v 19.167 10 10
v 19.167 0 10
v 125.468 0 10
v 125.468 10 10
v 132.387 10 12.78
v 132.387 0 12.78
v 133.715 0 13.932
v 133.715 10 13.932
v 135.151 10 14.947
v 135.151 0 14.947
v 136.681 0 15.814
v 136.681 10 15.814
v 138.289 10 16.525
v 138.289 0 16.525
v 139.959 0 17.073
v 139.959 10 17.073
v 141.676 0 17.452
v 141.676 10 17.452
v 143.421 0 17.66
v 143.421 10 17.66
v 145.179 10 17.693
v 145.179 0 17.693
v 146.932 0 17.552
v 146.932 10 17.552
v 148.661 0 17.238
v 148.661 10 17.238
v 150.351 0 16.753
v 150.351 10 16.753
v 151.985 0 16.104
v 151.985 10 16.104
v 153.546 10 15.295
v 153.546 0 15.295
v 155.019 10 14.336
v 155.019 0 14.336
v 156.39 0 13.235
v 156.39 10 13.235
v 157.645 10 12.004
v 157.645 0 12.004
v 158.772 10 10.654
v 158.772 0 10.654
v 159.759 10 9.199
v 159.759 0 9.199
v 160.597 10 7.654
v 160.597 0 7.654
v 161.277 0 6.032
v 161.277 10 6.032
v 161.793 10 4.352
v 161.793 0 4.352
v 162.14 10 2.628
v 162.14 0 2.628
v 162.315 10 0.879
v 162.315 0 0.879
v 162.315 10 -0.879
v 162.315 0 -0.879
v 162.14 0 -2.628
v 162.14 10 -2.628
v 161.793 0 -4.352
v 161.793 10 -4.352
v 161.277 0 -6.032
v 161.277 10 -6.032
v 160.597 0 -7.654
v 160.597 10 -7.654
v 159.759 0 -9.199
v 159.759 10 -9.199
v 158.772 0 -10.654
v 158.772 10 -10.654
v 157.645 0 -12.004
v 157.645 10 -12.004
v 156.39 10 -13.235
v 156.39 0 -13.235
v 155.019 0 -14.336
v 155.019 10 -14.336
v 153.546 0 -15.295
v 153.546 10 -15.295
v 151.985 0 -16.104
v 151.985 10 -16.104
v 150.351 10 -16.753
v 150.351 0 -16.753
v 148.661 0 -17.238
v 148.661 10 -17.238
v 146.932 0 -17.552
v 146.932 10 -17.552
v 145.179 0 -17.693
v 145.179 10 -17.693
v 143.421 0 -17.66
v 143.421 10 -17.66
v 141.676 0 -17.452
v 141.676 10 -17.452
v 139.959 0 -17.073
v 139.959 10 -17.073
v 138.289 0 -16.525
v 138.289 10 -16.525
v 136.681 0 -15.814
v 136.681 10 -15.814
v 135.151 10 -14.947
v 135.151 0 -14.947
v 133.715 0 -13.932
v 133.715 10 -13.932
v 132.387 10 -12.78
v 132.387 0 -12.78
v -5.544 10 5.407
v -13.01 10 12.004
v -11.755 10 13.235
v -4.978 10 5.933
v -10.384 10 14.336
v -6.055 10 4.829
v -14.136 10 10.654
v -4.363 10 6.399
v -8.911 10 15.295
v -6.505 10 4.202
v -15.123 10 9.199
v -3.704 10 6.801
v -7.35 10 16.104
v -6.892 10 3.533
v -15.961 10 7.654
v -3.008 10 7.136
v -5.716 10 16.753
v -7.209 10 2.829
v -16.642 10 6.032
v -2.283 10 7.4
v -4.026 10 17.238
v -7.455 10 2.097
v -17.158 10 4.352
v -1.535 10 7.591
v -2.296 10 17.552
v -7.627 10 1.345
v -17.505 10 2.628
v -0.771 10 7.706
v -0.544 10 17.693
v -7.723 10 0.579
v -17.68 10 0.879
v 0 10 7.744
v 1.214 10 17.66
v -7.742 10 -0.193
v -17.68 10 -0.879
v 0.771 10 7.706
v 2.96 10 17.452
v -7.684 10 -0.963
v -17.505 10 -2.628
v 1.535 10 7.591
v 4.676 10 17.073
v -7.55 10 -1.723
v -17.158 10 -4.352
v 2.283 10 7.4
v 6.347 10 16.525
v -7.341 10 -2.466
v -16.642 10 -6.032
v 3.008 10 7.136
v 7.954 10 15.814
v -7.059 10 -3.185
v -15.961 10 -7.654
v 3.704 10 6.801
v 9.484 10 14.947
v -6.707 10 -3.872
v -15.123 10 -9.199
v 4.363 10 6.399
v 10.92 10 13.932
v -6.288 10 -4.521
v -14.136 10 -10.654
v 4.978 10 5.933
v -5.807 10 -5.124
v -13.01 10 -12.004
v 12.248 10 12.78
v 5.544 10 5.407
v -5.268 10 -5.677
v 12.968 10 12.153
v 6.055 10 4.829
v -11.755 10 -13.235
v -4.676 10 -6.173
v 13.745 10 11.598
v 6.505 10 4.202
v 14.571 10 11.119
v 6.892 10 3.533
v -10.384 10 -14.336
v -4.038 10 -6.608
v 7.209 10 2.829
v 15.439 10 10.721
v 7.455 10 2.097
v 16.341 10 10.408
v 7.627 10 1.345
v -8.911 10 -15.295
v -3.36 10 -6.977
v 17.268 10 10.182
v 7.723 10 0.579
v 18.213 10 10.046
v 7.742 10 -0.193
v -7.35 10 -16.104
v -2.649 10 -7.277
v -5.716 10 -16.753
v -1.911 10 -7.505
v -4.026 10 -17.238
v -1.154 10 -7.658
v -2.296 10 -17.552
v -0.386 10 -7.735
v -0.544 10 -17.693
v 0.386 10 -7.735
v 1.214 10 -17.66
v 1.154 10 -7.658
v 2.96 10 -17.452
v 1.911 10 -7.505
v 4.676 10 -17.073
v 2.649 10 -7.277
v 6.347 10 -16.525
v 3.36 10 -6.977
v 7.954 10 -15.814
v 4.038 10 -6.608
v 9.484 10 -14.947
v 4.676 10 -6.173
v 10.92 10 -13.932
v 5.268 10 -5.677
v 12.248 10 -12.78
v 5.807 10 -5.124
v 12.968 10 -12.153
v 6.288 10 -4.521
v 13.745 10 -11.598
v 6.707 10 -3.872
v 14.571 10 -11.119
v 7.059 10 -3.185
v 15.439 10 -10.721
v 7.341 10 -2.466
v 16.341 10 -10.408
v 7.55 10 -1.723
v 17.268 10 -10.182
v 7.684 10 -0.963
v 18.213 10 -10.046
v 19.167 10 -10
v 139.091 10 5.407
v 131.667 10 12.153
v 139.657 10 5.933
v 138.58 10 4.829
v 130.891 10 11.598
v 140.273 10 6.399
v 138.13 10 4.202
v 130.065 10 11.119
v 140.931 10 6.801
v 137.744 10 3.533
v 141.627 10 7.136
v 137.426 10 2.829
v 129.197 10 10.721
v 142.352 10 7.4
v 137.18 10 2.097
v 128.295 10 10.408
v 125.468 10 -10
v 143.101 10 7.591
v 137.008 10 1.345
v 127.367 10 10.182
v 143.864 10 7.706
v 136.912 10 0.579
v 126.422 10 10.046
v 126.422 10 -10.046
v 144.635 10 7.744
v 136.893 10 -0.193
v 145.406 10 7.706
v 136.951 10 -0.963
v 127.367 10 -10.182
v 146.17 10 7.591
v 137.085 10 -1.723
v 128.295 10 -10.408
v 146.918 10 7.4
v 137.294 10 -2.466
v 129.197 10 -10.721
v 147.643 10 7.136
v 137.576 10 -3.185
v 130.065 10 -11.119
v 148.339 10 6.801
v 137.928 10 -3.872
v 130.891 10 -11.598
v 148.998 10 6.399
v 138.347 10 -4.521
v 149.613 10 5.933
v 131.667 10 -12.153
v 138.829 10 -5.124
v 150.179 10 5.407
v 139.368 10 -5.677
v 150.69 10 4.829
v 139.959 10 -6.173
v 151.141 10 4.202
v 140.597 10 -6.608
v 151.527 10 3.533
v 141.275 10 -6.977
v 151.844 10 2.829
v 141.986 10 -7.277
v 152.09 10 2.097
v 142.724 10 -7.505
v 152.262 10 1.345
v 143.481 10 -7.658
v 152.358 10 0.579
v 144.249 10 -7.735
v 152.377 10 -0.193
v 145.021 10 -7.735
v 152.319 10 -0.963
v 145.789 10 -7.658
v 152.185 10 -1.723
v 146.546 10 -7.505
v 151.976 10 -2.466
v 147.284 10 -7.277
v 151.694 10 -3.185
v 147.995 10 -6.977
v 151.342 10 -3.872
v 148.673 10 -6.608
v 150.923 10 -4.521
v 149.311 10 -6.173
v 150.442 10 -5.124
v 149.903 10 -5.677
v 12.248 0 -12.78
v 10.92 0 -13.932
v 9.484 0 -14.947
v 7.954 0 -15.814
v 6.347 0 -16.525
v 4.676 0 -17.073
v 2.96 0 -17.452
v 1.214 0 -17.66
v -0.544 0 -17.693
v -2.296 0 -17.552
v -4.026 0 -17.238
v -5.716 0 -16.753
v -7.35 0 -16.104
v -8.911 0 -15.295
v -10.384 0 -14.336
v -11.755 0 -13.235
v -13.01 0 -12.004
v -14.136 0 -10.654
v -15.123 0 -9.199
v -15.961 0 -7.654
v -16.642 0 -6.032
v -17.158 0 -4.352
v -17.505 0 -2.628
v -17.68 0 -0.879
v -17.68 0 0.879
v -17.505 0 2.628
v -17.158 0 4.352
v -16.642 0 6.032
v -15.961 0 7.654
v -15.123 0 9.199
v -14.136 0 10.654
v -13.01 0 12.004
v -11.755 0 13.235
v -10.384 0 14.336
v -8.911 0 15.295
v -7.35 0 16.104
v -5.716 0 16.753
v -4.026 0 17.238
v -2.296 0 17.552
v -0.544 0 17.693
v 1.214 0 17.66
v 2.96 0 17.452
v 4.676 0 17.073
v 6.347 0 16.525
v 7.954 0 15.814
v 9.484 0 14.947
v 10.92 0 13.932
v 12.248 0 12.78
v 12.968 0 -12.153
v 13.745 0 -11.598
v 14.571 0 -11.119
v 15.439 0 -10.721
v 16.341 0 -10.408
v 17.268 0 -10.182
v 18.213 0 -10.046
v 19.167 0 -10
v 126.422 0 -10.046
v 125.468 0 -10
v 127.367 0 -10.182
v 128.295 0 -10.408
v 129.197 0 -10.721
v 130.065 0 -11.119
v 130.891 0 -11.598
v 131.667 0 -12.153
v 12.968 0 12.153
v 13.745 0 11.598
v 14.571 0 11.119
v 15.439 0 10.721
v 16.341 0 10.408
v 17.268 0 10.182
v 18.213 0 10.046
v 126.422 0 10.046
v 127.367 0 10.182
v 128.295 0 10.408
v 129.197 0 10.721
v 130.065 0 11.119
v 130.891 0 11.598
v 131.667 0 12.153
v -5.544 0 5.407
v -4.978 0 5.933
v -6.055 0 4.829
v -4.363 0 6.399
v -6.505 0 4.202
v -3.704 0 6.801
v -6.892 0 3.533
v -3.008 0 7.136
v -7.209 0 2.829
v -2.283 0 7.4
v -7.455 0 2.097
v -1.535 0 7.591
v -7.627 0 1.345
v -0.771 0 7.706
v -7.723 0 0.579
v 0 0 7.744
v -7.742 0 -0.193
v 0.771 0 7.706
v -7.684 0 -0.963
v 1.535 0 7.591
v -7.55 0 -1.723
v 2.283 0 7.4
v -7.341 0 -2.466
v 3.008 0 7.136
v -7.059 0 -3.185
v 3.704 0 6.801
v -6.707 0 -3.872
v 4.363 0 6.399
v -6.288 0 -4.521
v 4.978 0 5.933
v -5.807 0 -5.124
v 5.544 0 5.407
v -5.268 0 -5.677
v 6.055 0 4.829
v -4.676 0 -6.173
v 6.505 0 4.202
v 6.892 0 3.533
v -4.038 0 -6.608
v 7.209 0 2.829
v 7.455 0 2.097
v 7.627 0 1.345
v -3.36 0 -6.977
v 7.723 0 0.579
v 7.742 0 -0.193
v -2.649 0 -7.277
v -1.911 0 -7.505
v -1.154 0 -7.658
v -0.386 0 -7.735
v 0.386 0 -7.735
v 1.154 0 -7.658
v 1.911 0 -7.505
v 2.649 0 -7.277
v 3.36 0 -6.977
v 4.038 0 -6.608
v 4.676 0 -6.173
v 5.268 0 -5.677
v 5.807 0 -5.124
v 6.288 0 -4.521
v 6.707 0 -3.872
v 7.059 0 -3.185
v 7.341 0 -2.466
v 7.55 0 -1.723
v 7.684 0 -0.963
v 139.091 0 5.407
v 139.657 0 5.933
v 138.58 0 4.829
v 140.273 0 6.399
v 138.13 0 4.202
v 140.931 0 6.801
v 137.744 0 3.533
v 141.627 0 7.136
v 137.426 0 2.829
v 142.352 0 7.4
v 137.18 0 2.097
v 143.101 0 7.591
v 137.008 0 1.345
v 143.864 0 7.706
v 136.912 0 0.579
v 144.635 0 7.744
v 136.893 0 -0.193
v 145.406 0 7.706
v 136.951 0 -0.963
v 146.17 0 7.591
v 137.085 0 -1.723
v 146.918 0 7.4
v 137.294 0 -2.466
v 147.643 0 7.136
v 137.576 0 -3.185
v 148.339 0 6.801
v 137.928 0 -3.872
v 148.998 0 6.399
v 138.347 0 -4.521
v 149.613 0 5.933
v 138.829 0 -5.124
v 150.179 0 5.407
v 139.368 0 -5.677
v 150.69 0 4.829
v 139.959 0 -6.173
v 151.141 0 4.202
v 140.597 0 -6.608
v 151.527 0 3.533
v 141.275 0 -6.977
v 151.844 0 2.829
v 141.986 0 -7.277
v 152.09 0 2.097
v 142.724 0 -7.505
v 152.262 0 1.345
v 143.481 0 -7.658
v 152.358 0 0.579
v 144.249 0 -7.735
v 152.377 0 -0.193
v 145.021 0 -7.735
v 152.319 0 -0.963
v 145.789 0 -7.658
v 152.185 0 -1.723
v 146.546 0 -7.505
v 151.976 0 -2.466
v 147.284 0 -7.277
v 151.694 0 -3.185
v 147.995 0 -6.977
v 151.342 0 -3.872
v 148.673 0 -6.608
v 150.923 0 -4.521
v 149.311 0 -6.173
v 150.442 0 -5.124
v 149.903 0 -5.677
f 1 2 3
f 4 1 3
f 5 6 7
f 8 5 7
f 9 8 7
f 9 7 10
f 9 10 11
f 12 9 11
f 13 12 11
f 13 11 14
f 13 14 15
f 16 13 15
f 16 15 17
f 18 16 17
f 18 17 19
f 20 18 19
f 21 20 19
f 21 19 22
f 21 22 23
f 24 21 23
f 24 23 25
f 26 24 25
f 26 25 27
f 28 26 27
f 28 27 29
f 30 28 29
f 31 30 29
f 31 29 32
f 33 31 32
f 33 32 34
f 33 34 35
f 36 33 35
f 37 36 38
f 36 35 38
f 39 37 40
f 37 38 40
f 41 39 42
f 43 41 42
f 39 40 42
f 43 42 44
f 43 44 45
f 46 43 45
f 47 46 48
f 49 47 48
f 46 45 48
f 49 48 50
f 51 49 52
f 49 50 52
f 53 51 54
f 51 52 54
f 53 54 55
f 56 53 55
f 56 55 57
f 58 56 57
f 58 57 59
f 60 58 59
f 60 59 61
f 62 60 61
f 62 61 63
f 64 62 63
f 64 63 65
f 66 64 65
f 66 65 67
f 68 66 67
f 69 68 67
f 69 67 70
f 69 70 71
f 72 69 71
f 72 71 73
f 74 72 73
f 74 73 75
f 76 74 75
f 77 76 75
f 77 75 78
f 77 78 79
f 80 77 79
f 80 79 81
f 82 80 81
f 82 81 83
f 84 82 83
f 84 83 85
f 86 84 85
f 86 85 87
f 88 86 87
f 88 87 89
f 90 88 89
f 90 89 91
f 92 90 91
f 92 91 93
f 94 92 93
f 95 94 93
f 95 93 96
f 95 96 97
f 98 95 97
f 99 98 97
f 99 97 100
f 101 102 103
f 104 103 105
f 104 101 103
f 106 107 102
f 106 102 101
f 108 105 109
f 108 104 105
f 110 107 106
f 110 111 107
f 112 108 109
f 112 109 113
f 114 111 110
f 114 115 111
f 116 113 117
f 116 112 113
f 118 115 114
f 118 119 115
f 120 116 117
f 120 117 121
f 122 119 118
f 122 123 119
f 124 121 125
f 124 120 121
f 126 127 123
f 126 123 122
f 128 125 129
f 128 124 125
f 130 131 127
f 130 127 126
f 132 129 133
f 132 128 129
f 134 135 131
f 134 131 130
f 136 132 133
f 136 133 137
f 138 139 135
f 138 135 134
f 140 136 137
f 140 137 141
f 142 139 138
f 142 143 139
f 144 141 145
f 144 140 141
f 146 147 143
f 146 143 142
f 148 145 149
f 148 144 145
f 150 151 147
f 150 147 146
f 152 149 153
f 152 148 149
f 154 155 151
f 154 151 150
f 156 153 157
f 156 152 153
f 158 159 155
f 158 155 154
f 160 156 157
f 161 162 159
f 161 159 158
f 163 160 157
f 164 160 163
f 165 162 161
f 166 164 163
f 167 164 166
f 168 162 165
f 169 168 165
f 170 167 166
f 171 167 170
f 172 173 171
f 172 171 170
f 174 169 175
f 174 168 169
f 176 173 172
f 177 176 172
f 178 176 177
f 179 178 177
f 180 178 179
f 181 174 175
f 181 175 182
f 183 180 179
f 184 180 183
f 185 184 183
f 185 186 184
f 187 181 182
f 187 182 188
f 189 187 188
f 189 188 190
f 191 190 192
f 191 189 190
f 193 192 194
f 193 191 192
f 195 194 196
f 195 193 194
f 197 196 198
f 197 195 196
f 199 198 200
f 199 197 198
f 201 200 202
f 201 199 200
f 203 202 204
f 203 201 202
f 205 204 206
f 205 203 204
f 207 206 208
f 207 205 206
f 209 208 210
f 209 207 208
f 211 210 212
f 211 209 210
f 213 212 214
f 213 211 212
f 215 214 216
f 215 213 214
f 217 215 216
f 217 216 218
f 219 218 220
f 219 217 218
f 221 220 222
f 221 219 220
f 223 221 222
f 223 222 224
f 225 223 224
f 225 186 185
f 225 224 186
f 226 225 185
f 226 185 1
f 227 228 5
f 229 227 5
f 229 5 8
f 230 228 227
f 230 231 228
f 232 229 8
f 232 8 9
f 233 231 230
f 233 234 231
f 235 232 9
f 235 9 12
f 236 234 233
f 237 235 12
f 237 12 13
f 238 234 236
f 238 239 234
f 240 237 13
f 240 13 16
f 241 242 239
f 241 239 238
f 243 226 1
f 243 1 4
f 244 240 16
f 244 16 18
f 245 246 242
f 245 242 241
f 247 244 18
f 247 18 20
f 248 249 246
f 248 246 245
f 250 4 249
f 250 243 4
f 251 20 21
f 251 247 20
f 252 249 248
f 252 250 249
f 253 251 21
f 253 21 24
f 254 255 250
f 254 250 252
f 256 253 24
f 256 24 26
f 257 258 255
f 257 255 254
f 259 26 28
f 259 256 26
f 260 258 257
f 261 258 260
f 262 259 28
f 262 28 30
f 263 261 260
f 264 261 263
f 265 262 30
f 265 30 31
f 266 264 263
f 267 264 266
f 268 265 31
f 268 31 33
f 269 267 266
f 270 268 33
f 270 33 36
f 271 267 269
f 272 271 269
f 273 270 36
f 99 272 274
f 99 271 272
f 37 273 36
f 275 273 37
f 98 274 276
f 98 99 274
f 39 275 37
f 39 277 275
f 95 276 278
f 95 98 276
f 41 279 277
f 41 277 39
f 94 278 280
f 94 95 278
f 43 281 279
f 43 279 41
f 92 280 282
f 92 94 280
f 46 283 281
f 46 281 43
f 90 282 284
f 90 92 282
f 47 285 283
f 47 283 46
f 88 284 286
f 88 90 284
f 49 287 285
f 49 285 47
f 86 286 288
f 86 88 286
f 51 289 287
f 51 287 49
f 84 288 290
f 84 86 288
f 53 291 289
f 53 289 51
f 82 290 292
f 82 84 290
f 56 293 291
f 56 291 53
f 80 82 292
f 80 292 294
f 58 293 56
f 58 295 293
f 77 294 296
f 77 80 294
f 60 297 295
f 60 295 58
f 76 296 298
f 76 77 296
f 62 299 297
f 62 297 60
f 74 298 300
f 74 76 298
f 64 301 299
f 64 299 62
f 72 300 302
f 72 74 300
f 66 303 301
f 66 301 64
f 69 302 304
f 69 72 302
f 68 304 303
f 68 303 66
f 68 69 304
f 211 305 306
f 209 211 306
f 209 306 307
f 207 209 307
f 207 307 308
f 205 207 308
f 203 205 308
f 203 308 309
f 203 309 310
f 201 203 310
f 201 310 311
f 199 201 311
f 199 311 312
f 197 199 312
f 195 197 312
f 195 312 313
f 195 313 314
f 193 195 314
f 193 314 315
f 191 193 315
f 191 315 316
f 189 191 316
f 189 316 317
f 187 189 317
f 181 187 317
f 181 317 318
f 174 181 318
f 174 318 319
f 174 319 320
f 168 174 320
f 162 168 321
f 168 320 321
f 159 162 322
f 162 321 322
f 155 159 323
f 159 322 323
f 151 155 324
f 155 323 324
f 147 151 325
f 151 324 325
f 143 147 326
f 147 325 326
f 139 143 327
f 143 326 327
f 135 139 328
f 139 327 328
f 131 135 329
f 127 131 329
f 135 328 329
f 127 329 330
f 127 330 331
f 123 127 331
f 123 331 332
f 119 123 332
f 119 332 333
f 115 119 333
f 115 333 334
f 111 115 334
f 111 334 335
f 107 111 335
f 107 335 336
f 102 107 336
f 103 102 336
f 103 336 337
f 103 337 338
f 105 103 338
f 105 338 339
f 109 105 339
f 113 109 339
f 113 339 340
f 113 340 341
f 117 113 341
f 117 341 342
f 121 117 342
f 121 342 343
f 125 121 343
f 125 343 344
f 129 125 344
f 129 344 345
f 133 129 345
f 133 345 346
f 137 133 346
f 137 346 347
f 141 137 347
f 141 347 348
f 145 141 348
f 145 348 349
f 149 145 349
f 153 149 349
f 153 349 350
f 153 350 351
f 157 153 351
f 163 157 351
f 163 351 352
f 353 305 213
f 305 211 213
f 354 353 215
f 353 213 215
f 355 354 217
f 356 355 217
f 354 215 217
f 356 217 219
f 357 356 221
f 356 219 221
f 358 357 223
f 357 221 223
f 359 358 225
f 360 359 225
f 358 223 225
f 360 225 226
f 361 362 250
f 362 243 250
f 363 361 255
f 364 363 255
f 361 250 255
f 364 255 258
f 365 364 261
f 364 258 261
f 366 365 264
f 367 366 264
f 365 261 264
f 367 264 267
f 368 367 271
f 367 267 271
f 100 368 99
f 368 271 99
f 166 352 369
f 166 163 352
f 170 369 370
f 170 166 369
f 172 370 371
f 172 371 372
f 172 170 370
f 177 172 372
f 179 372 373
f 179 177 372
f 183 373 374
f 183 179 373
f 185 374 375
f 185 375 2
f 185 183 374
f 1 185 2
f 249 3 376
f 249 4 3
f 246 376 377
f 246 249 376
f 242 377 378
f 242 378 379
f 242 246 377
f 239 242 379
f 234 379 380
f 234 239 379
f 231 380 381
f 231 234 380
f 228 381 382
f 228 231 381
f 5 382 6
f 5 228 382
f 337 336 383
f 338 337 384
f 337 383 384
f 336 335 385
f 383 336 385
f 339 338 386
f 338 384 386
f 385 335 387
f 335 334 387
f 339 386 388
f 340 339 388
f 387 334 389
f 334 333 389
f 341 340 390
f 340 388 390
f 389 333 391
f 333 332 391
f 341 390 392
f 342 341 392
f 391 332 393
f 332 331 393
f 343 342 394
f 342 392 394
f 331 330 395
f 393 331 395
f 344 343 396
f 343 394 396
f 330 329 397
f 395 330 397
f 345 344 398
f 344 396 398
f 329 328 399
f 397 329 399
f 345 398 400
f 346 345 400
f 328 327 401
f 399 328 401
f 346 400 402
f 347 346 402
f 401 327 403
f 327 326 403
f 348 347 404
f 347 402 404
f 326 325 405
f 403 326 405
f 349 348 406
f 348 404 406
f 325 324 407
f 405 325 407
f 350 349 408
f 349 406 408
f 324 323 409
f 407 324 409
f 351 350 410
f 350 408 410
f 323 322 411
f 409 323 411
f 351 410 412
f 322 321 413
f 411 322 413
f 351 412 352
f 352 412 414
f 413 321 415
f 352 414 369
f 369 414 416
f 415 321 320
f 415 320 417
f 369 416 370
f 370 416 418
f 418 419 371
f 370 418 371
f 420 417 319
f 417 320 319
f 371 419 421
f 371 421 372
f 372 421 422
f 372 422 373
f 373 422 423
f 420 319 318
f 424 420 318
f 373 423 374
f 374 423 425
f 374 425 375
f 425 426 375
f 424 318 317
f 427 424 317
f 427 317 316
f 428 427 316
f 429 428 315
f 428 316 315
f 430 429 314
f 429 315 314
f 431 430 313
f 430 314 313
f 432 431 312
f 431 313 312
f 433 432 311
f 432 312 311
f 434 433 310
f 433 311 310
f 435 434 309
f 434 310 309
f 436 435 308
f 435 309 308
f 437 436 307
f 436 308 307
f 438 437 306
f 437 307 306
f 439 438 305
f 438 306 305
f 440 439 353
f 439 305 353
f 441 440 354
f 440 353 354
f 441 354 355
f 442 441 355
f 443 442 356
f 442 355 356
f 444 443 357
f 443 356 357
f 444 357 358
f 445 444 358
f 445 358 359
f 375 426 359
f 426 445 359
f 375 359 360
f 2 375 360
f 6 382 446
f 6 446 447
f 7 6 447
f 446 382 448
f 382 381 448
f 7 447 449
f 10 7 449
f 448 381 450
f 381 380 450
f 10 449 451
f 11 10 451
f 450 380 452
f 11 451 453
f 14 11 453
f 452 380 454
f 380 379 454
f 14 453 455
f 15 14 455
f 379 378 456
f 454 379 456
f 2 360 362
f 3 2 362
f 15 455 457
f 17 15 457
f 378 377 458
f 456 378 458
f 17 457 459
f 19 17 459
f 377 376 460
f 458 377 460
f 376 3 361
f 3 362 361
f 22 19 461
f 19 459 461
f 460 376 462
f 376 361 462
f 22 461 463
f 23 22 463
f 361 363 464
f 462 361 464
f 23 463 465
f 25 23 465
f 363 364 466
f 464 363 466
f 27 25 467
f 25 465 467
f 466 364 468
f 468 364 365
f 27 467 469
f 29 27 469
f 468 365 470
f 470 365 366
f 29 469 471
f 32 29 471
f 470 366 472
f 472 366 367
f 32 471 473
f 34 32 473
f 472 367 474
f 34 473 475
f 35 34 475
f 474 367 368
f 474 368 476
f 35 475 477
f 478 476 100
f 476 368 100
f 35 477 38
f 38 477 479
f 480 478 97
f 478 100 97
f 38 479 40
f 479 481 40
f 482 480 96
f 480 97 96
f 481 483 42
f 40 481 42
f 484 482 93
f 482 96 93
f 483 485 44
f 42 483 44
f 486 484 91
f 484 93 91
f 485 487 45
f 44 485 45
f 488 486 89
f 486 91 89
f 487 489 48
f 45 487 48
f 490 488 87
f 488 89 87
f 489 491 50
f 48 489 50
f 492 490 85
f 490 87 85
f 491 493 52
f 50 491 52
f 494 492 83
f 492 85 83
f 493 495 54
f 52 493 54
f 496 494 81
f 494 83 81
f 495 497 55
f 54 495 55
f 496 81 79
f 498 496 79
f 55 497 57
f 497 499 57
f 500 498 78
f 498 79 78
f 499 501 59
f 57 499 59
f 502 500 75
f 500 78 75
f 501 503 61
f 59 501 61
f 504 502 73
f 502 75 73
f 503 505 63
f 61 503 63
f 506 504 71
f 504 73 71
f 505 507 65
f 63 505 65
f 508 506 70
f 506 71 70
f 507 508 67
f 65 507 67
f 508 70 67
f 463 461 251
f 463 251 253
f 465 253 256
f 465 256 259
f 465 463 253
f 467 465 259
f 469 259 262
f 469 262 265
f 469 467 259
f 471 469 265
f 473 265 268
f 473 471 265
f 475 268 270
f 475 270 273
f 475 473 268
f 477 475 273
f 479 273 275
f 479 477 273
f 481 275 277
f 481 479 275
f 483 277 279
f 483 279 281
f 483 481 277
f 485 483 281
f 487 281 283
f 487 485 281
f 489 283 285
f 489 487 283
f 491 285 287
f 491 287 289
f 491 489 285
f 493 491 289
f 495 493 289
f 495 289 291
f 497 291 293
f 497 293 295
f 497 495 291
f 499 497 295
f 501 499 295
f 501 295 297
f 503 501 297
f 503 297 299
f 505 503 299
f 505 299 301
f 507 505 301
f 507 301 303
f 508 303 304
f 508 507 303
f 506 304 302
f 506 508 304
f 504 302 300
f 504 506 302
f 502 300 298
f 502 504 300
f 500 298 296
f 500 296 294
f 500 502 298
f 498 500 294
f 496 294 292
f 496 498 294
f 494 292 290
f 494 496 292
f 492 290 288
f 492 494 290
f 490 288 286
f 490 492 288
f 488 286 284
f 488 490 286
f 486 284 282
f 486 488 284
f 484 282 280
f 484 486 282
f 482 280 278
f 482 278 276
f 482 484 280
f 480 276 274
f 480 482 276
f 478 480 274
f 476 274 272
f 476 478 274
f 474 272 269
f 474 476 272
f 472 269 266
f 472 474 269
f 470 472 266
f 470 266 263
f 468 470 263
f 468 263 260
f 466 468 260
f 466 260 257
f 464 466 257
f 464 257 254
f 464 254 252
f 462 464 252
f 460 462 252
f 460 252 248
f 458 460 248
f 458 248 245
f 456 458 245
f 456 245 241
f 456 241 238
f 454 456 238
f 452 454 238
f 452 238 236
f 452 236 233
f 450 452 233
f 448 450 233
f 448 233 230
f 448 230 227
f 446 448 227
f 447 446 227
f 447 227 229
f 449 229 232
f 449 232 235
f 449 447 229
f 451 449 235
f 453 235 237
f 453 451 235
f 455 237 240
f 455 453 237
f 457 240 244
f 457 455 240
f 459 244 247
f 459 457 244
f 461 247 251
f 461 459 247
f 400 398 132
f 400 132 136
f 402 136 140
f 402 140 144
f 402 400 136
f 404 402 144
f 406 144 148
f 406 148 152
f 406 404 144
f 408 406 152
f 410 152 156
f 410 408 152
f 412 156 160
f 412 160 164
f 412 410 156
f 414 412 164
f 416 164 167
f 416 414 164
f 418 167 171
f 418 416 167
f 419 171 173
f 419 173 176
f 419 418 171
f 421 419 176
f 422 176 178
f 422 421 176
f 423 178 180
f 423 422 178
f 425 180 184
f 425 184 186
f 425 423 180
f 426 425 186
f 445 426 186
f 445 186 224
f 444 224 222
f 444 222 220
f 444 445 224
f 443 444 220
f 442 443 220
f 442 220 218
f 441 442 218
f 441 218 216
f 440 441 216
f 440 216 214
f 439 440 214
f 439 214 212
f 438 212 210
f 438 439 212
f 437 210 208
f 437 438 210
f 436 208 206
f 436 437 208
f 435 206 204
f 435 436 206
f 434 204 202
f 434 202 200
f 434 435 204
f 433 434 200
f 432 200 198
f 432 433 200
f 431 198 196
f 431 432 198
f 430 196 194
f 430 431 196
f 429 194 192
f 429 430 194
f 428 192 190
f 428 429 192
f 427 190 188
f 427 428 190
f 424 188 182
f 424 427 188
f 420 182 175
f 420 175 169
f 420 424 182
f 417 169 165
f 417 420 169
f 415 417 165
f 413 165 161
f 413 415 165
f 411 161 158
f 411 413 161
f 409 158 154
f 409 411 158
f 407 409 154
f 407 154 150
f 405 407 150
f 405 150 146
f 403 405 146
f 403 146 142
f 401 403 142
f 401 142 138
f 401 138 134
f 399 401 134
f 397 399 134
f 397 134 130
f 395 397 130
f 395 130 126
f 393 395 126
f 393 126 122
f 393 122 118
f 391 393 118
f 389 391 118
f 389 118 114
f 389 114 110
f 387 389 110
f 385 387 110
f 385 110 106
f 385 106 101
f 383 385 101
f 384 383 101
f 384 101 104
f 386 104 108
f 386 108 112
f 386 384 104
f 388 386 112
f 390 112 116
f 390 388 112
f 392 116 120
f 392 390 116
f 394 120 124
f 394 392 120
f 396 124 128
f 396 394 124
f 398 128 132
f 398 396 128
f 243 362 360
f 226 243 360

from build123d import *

# Parameters (mm, degrees)
SKETCH_1_R      = 7.744401216
EXTRUDE_1_DEPTH = 10
FILLET_1_R      = 10


with BuildPart() as part:
    # 草图1 → 凸台-拉伸1 (new body)
    with BuildSketch(Plane(origin=(0, 0, 0), x_dir=(1, 0, 0), z_dir=(0, 1, 0))):
        with BuildLine():
            ThreePointArc((14.606255334, 10), (-17.701488493, 0), (14.606255334, -10))
            Line((14.606255334, -10), (130.028894825, -10))
            ThreePointArc((130.028894825, -10), (162.336638652, 0), (130.028894825, 10))
            Line((130.028894825, 10), (14.606255334, 10))
        make_face()
        with Locations(Location((0, 0, 0), (0, 0, 270))):
            Circle(SKETCH_1_R, mode=Mode.SUBTRACT)
        with Locations(Location((144.635150159, 0, 0), (0, 0, 270))):
            Circle(SKETCH_1_R, mode=Mode.SUBTRACT)
    extrude(amount=EXTRUDE_1_DEPTH)

    # 圆角1
    fillet_1_edges = [part.edges().sort_by_distance(p)[0] for p in [
        (130.028894825, 5, -10),
        (130.028894825, 5, 10),
        (14.606255334, 5, 10),
        (14.606255334, 5, -10),
    ]]
    fillet(fillet_1_edges, radius=FILLET_1_R)


solid = part.part
